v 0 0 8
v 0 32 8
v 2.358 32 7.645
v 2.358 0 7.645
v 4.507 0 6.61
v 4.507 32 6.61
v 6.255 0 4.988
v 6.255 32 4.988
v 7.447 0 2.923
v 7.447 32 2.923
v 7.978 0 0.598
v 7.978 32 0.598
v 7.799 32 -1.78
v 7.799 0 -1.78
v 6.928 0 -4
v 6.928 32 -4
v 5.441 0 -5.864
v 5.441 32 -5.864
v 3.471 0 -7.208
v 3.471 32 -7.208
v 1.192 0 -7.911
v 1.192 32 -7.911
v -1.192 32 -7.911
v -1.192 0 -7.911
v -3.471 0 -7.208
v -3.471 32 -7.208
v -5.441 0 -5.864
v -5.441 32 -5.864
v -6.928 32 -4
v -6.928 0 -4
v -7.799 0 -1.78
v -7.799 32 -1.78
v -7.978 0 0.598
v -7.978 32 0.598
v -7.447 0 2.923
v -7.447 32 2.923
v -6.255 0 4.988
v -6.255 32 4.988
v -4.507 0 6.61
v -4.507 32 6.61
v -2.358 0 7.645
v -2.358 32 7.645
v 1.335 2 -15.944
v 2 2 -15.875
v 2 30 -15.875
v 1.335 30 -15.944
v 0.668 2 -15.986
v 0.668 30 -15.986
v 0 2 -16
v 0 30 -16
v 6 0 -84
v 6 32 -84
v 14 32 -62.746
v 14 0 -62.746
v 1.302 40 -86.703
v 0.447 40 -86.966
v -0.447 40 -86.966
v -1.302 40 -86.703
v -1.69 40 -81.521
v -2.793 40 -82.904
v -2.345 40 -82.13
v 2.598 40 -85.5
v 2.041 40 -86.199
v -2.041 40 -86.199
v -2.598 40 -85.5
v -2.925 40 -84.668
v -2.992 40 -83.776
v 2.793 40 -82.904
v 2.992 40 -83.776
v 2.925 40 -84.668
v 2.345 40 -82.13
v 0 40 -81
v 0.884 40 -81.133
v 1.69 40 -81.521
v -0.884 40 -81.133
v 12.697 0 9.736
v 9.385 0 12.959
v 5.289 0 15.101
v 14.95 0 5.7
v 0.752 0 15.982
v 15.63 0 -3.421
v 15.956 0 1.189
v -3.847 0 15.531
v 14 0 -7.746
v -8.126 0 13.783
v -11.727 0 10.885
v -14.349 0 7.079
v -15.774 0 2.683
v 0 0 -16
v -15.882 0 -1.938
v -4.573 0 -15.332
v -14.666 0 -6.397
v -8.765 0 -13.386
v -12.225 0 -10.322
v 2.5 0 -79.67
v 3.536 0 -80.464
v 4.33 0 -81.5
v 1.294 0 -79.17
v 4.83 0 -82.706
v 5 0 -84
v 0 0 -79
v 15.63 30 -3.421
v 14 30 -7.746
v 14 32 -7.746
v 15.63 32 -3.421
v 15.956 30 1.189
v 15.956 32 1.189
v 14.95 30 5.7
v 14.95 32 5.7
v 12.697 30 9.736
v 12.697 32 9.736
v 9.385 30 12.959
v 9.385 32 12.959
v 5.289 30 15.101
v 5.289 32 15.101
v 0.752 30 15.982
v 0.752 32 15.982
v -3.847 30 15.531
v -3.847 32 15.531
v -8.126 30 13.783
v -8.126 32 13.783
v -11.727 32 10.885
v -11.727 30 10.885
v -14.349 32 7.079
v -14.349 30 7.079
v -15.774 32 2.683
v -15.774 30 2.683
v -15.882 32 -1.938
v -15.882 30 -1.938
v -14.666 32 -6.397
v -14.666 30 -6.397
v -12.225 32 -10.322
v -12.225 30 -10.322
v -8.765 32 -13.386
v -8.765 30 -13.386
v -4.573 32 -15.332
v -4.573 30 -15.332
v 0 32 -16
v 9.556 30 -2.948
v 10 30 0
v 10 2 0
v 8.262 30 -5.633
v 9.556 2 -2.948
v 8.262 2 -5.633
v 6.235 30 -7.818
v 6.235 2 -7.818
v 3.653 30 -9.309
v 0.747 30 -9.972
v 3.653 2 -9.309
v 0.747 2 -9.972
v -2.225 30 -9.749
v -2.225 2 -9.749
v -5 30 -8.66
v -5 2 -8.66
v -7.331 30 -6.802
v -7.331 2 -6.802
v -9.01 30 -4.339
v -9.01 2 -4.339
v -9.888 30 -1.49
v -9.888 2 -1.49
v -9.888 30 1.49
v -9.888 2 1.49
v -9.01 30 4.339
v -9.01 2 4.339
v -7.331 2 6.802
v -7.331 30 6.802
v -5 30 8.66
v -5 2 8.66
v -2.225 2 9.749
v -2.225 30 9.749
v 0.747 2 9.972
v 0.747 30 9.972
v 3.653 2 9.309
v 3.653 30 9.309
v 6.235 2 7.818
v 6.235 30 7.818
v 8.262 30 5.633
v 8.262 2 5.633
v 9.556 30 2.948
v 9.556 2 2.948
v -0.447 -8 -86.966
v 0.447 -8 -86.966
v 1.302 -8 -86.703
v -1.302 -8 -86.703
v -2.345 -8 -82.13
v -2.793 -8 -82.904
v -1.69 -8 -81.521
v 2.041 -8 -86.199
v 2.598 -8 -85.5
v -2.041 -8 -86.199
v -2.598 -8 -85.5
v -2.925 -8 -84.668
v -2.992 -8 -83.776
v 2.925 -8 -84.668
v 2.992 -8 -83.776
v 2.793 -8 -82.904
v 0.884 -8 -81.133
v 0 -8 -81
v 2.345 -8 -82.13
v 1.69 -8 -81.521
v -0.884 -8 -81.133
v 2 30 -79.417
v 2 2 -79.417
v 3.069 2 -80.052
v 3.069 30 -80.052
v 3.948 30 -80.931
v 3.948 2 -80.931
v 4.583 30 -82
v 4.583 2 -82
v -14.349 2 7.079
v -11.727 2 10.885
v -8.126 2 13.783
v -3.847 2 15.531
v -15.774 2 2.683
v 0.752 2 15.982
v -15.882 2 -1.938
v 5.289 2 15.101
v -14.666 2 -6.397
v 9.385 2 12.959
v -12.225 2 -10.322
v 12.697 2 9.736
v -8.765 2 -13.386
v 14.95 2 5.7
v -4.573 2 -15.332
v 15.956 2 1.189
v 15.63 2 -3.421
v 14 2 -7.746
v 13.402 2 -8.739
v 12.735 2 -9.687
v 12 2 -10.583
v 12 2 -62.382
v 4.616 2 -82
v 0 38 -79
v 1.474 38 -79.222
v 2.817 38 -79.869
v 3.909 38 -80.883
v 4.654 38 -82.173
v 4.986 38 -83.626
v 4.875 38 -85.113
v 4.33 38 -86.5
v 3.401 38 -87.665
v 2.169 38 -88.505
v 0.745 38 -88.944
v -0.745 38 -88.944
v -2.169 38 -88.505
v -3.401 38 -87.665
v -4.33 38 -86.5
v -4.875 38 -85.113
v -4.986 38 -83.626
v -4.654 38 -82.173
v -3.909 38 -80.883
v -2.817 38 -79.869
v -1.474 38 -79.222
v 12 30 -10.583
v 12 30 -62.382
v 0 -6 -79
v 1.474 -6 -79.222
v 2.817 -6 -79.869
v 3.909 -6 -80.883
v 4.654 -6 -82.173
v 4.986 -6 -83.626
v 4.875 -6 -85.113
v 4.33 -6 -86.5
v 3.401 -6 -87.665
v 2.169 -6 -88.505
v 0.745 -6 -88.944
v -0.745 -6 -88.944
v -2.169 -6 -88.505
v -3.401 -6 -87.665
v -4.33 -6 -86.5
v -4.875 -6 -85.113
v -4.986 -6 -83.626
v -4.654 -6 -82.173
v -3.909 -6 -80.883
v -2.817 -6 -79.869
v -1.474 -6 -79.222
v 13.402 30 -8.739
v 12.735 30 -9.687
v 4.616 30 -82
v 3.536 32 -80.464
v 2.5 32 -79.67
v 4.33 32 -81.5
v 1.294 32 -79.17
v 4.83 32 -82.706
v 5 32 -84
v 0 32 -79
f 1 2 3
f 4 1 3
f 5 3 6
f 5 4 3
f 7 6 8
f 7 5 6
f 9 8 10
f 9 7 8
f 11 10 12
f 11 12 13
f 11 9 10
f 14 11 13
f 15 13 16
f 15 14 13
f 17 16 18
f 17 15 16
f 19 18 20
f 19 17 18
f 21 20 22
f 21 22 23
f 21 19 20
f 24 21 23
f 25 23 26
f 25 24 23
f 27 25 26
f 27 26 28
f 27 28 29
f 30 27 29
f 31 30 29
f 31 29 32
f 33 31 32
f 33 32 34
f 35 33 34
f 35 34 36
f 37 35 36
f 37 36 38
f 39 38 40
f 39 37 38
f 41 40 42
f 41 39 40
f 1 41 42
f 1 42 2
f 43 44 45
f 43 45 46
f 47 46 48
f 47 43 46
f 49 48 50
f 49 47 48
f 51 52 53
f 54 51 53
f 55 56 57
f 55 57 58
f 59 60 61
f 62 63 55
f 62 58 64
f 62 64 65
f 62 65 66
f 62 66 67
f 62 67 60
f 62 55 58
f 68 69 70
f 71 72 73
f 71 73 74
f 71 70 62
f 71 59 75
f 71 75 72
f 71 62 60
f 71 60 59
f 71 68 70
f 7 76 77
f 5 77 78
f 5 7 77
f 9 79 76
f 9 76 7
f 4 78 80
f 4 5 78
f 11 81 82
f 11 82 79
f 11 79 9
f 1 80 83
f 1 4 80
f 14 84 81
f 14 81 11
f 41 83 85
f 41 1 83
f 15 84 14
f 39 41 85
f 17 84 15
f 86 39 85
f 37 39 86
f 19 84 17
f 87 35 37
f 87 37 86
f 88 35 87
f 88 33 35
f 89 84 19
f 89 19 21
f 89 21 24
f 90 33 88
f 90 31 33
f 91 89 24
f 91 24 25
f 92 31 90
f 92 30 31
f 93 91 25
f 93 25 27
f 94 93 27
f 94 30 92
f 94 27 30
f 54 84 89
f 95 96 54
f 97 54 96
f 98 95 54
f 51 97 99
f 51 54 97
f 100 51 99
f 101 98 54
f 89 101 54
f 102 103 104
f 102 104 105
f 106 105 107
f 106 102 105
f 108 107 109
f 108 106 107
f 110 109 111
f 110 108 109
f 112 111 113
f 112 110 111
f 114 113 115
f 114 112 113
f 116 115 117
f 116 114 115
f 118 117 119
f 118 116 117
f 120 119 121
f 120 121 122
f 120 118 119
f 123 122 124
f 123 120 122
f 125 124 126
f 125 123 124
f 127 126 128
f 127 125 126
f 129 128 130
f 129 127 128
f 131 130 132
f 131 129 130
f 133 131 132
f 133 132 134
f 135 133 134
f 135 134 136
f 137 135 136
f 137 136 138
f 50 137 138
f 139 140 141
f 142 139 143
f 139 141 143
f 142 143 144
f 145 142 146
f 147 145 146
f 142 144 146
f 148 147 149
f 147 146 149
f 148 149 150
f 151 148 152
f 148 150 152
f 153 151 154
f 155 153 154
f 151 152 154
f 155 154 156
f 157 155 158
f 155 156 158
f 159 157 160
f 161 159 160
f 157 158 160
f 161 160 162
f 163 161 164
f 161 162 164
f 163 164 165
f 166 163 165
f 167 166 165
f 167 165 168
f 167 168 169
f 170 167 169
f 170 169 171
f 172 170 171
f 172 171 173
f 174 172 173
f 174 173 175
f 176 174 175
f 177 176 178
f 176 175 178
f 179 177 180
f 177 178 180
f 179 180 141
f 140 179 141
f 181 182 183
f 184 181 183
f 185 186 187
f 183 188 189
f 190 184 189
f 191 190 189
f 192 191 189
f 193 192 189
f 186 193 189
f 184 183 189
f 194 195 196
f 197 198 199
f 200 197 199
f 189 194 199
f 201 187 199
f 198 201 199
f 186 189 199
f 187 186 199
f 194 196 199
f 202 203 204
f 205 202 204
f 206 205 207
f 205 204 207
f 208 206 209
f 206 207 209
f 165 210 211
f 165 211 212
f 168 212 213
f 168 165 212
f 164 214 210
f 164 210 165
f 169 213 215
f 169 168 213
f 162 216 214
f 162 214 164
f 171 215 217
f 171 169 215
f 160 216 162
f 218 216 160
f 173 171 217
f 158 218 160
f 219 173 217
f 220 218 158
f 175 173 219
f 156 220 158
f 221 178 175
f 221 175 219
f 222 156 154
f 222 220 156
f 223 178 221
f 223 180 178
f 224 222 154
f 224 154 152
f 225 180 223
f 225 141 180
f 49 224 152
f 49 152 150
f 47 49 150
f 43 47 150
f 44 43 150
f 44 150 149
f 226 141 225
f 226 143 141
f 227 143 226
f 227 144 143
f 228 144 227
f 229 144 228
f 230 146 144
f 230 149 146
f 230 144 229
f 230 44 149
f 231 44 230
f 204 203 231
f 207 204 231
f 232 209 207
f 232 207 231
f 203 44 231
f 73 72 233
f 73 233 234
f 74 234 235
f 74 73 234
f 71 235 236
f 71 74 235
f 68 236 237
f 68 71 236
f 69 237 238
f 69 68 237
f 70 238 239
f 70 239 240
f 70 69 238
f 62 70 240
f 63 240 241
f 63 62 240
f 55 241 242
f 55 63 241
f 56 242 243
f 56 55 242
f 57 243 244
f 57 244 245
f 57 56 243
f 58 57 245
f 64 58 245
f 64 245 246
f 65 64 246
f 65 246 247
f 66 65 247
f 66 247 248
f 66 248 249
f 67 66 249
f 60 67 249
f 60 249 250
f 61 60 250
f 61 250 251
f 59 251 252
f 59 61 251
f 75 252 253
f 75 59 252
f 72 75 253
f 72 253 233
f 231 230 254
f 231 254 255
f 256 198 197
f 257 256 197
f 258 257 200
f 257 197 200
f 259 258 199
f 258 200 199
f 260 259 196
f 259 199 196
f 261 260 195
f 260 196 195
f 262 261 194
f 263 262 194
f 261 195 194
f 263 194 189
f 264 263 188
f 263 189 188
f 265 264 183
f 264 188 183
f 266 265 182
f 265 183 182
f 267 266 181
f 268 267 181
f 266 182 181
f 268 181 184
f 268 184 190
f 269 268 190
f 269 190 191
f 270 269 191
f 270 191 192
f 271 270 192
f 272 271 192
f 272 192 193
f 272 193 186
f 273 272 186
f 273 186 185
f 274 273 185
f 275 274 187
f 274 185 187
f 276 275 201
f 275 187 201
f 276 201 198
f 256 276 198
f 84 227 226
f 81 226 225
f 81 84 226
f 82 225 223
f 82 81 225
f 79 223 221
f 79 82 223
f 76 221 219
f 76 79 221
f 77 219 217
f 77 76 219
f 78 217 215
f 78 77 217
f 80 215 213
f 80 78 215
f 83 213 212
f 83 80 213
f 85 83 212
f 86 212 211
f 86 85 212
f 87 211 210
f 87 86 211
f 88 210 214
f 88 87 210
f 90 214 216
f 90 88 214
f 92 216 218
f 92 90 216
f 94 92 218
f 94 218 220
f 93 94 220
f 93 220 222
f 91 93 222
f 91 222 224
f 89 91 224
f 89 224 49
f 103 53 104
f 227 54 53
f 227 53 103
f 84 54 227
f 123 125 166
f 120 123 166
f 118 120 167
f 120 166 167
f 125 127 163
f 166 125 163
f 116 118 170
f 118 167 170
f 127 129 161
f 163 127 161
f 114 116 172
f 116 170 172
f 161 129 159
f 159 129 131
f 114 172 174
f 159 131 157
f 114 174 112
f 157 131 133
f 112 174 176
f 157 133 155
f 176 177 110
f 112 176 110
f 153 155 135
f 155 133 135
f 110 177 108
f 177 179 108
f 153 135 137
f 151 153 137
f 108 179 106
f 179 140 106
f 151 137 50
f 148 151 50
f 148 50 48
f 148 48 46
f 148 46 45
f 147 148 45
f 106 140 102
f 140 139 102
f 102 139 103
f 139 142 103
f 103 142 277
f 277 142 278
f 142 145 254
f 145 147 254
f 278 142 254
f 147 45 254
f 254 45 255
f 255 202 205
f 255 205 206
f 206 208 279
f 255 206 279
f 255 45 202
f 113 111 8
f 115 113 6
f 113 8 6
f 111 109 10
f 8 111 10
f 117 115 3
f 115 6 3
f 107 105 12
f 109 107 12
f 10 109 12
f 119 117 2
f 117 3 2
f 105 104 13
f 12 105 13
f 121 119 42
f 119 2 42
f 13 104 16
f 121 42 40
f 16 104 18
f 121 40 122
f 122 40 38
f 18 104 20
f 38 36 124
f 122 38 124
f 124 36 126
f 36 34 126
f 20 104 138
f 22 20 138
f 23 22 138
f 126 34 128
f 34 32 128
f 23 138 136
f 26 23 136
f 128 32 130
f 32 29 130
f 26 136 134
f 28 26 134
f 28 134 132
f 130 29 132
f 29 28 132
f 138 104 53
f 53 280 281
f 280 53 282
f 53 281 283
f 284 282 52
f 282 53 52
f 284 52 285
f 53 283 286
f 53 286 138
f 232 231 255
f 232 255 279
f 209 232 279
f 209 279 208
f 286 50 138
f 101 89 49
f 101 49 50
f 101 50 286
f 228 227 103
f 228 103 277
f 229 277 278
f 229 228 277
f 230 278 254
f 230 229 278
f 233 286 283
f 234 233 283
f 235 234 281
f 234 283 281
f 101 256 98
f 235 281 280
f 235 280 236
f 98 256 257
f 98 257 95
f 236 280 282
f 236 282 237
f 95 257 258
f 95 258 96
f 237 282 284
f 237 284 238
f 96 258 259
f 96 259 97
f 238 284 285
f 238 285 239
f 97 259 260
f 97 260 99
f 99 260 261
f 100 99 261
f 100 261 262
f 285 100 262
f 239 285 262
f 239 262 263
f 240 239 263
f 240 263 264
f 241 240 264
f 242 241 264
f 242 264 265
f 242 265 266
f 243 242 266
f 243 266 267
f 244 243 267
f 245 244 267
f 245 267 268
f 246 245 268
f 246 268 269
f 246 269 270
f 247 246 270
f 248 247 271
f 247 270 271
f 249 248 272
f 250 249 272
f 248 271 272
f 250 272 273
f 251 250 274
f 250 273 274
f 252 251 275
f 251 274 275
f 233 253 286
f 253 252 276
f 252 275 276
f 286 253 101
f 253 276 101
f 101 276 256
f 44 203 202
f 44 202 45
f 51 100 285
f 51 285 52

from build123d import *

# Parameters (mm, degrees)
SKETCH1_R                = 8
BOSS_EXTRUDE1_DEPTH      = 32
SHELL3_START             = 2
SHELL3_OUTLINE_R         = 10
SHELL3_DEPTH             = 28
BOSS_EXTRUDE2_DEPTH      = 8
BOSS_EXTRUDE2_DEPTH_BACK = 40
SKETCH2_R                = 5
CHAMFER1_SIZE            = 2


# Read off the part's stored shape, not the designer's step: Shell3
with BuildPart() as part:
    # Sketch1 → Boss-Extrude1 (new body)
    with BuildSketch(Plane(origin=(0, 0, 0), x_dir=(1, 0, 0), z_dir=(0, 1, 0))):
        with BuildLine():
            Line((6, 84), (14, 62.745966692))
            Line((14, 62.745966692), (14, 7.745966692))
            ThreePointArc((14, 7.745966692), (-8.126024025, -13.782878275), (0, 16))
            Line((0, 16), (0, 84))
            Line((0, 84), (6, 84))
        make_face()
        with Locations(Location((0, 0, 0), (0, 0, 270))):
            Circle(SKETCH1_R, mode=Mode.SUBTRACT)
    extrude(amount=BOSS_EXTRUDE1_DEPTH)

    # Shell3 outline → Shell3 (cut)
    with BuildSketch(Plane(origin=(0, 0, 0), x_dir=(1, 0, 0), z_dir=(0, 1, 0)).offset(SHELL3_START)):
        with BuildLine():
            ThreePointArc((2, 15.874507866), (1.001966601, 15.968596148), (0, 16))
            ThreePointArc((0, 16), (-8.126024026, -13.782878275), (14, 7.745966692))
            ThreePointArc((14, 7.745966692), (13.077163184, 9.218882962), (12, 10.583005244))
            Line((12, 10.583005244), (12, 62.382030987))
            Line((12, 62.382030987), (4.615813204, 82))
            Line((4.615813204, 82), (2, 82))
            Line((2, 82), (2, 15.874507866))
        make_face()
        Circle(SHELL3_OUTLINE_R, mode=Mode.SUBTRACT)
    extrude(amount=SHELL3_DEPTH, mode=Mode.SUBTRACT)

    # Sketch2 → Boss-Extrude2 (add, two sides: drawn at the far end of the back side and taken through both)
    with BuildSketch(Plane(origin=(0, 32, 0), x_dir=(1, 0, 0), z_dir=(0, 1, 0)).offset(-BOSS_EXTRUDE2_DEPTH_BACK)):
        with Locations(Location((0, 84, 0), (0, 0, 270))):
            Circle(SKETCH2_R)
    extrude(amount=BOSS_EXTRUDE2_DEPTH + BOSS_EXTRUDE2_DEPTH_BACK)

    # Chamfer1
    chamfer1_edges = [part.edges().sort_by_distance(p)[0] for p in [
        (0, -8, -89),
        (0, 40, -89),
    ]]
    chamfer(chamfer1_edges, length=CHAMFER1_SIZE)


solid = part.part
